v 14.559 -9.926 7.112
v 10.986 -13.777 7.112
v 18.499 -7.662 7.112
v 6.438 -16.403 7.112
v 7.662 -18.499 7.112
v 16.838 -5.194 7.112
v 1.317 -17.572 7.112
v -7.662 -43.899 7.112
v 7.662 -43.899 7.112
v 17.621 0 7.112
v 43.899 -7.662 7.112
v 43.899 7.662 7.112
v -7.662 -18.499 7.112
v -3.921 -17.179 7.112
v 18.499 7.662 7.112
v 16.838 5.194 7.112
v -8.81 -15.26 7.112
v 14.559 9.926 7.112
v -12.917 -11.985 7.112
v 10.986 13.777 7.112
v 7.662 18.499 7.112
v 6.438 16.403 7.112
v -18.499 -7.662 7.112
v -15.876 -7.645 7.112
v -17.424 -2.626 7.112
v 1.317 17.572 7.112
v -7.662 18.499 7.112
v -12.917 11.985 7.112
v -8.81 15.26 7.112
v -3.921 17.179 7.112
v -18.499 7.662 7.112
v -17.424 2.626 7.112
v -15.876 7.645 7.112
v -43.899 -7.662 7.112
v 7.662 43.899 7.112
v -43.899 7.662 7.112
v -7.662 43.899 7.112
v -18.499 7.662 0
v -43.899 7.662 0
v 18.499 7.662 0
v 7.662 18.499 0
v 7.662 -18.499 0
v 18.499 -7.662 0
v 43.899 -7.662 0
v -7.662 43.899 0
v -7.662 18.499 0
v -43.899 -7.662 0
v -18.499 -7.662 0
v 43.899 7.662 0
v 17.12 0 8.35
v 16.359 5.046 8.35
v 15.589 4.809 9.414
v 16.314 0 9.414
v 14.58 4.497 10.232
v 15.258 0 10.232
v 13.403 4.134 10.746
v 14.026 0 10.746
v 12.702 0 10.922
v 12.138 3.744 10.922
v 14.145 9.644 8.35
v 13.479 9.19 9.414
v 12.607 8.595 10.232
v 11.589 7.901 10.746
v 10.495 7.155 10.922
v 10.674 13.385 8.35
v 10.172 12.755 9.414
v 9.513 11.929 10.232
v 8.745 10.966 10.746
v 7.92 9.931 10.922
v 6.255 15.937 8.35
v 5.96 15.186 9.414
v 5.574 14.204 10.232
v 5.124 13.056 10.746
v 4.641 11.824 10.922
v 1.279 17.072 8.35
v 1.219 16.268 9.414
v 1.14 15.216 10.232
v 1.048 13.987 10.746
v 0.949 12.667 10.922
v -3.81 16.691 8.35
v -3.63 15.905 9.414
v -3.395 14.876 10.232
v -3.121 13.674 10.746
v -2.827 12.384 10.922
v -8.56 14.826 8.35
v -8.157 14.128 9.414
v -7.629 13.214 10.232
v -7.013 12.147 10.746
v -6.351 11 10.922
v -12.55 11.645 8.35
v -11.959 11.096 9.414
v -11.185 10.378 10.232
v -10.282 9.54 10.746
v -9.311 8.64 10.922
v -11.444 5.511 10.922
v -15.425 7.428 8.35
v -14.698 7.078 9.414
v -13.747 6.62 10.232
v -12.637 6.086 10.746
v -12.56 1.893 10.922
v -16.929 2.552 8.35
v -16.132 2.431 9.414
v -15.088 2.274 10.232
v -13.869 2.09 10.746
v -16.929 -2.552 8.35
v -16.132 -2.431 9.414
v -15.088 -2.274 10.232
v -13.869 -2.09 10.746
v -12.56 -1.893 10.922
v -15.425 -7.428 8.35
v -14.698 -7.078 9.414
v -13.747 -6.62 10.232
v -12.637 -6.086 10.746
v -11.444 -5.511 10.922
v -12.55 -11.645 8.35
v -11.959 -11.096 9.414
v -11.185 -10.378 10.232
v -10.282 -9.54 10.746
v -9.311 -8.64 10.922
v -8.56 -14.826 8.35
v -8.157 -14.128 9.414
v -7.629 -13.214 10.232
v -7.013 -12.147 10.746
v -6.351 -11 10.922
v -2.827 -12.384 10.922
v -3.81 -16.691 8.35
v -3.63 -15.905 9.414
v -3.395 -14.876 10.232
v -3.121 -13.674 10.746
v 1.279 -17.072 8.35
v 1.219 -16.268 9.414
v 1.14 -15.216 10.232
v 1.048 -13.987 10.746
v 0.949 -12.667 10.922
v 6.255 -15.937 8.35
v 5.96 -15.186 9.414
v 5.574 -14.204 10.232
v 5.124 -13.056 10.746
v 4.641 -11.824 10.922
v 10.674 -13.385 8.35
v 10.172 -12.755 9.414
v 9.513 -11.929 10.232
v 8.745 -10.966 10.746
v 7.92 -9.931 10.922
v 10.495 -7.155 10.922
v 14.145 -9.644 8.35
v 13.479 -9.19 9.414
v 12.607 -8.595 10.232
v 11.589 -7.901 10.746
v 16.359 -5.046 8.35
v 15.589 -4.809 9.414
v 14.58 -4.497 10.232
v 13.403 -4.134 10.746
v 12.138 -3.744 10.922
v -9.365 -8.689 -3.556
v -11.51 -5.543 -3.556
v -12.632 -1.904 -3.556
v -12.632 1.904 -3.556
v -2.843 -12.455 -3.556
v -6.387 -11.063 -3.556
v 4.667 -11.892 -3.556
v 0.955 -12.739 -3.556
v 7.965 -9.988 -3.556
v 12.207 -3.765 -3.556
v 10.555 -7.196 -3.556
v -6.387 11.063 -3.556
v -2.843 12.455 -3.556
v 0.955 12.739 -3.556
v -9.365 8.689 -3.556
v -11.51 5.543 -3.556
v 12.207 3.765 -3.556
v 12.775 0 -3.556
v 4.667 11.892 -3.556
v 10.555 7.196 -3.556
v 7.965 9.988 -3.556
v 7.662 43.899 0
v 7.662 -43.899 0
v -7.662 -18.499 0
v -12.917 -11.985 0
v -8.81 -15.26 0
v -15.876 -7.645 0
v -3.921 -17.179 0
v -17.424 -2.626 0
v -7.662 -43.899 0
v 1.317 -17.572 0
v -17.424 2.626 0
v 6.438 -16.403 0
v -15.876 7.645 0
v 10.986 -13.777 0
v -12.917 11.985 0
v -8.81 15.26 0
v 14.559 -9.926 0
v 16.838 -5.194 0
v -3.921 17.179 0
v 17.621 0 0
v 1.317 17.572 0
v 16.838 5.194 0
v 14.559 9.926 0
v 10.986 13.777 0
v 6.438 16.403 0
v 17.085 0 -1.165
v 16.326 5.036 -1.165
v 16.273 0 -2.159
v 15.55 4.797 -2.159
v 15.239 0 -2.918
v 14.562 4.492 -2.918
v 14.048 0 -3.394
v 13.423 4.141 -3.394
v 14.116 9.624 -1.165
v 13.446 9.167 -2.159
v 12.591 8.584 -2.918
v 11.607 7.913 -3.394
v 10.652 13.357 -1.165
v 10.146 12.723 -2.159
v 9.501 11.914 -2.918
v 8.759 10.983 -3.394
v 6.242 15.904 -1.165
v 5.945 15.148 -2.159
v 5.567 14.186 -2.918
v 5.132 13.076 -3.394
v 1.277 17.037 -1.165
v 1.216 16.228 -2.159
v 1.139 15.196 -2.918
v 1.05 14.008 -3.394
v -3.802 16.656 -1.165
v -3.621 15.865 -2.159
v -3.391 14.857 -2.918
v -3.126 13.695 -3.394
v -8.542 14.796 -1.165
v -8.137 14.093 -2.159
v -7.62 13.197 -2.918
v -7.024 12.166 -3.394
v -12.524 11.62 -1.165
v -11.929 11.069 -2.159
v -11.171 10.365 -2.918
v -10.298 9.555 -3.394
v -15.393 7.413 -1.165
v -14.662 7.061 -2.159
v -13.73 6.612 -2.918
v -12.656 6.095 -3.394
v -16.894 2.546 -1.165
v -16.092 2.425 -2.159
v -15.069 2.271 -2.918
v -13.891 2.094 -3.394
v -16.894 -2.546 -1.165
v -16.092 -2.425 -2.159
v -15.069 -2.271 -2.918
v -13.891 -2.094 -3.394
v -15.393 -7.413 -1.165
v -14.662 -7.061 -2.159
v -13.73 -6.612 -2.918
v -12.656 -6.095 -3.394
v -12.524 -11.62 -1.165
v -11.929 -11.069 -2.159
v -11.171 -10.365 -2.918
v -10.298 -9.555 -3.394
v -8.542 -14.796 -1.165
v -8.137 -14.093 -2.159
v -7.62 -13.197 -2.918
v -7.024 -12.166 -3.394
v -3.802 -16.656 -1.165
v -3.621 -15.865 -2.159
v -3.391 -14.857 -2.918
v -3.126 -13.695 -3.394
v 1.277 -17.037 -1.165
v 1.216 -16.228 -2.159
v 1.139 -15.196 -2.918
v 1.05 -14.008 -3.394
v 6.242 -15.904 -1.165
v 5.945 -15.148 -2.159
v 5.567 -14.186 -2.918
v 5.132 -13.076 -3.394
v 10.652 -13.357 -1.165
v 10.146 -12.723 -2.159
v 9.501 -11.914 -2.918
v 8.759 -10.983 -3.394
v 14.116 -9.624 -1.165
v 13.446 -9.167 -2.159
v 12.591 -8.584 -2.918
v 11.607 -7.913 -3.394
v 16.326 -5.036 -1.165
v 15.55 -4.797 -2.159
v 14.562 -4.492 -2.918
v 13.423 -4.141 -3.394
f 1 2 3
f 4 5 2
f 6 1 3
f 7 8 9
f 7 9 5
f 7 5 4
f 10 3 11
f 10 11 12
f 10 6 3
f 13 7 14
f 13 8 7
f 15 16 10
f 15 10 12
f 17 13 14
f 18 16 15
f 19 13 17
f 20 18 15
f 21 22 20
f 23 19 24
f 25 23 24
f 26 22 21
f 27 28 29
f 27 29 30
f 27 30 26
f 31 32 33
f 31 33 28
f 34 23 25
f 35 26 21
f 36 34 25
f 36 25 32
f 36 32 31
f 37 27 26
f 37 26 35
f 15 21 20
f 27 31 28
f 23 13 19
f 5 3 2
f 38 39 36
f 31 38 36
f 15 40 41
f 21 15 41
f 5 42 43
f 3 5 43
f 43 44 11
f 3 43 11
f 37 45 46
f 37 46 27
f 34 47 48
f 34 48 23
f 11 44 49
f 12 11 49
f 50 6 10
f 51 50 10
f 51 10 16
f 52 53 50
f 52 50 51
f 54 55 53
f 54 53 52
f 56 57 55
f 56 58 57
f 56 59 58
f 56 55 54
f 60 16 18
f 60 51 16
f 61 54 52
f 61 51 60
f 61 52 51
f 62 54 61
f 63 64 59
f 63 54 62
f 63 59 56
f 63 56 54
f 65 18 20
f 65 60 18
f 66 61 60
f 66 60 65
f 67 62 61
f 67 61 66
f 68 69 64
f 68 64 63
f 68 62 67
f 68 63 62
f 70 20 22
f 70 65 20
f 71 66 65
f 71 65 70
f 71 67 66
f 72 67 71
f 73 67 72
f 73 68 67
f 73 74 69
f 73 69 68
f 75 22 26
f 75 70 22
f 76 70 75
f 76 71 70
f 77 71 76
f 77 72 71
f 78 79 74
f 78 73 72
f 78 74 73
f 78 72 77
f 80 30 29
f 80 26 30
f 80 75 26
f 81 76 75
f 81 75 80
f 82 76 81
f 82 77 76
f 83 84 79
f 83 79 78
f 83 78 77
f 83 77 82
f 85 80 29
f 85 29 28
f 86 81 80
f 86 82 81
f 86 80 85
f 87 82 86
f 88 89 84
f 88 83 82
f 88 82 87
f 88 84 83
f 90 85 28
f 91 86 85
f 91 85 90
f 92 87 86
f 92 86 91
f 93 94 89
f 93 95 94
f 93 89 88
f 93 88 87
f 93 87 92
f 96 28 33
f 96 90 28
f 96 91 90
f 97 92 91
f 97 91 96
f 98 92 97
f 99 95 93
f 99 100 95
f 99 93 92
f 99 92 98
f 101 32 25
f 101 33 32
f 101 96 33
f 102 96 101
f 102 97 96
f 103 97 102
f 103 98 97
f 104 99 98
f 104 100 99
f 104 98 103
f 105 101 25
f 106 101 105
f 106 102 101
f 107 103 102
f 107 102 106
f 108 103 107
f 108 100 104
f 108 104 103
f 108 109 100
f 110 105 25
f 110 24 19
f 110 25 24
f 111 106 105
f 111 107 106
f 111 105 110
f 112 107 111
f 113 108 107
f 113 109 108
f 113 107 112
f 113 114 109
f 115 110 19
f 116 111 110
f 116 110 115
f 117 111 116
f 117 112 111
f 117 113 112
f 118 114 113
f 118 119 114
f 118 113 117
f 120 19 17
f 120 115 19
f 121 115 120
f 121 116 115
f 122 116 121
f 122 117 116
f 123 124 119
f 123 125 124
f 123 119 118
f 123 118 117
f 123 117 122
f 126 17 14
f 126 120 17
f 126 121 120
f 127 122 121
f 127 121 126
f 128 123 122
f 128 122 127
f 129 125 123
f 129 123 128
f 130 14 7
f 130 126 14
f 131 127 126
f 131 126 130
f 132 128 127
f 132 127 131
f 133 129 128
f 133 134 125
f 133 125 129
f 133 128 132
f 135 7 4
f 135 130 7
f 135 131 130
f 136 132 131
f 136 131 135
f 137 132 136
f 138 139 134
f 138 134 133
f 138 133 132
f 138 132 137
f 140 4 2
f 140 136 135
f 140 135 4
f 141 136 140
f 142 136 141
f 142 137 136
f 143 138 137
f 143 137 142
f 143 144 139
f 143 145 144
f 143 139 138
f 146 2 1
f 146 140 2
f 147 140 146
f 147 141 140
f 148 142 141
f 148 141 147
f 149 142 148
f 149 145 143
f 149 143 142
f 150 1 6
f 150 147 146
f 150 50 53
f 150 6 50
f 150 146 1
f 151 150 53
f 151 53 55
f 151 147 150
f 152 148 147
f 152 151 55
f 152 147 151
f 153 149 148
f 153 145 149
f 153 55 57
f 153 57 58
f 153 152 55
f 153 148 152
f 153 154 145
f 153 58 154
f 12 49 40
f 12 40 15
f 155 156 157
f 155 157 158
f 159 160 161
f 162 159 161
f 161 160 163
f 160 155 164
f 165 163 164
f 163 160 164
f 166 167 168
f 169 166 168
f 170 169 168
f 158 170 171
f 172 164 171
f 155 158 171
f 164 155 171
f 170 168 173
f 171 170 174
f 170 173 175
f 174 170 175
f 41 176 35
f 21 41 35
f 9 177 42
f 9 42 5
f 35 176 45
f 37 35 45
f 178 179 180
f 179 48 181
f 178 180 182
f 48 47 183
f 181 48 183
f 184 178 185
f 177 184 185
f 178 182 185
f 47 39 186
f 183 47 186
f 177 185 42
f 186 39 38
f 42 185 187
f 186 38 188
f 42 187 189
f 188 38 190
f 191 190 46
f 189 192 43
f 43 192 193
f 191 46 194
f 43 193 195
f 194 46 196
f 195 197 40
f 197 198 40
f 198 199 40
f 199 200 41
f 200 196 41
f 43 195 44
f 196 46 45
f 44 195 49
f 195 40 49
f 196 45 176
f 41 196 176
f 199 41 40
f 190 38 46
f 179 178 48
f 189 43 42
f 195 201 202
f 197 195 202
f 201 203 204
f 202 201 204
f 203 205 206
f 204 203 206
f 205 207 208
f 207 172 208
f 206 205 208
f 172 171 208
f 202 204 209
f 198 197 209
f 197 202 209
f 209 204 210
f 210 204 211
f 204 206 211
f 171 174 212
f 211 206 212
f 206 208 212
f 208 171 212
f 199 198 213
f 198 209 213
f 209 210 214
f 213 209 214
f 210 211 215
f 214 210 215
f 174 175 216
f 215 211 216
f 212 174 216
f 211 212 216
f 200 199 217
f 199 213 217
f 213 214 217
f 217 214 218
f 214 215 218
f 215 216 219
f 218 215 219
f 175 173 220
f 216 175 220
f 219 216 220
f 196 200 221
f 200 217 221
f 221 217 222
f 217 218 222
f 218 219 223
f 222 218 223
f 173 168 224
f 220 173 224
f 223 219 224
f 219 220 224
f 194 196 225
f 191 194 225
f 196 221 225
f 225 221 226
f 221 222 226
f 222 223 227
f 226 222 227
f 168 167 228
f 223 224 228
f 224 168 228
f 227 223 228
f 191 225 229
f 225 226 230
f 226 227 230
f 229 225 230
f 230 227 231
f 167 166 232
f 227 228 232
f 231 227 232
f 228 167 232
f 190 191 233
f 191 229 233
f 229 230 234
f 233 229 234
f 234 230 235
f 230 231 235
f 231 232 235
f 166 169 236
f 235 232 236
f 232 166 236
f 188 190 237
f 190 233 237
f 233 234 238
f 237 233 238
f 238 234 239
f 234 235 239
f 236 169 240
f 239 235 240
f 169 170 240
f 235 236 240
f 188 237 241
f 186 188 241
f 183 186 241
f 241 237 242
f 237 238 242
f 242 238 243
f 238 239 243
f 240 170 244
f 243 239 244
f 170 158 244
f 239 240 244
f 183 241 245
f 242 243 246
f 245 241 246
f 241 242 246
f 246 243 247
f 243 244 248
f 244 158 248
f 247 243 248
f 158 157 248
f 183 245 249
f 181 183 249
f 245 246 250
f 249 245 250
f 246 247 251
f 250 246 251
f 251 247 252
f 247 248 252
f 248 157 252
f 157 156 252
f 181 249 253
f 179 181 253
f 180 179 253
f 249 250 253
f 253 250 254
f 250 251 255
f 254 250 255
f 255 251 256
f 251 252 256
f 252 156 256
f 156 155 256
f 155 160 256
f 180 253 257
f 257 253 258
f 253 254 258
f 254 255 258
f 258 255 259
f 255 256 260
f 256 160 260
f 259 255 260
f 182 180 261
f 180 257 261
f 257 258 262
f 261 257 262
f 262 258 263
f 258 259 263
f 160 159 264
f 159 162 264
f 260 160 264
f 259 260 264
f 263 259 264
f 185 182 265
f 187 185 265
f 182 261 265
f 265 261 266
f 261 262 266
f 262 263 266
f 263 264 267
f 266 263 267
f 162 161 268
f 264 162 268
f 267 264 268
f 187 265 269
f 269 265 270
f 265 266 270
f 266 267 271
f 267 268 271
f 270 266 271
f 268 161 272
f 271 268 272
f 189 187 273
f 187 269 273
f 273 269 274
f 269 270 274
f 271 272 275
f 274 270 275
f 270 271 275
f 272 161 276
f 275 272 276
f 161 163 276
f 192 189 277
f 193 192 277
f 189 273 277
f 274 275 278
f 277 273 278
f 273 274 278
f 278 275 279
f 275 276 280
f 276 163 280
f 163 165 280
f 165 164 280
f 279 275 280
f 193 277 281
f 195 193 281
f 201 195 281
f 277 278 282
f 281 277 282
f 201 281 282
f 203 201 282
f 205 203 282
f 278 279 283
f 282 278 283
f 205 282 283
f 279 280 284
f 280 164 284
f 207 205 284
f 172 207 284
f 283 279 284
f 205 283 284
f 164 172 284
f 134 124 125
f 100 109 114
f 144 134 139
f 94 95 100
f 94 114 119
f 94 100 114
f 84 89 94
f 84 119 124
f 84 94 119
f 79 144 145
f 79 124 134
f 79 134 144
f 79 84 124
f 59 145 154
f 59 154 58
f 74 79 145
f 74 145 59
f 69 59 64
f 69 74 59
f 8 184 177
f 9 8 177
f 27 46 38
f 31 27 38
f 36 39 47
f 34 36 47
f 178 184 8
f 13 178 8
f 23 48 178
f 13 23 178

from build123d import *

# Parameters (mm, degrees)
F1_DEPTH = 7.112
F2_DEPTH = 25.4
F3_DEPTH = 25.4
F4_DEPTH = 25.4
F5_DEPTH = 25.4
F6_R     = 17.6209063201
F7_DEPTH = 10.922
F8_DEPTH = 3.556


# Not quite as in the source:
# - a fillet or chamfer that OpenCascade refuses, or shapes differently, is made with other operations: its cross-section is extruded or revolved along the edge and cut away or added


with BuildPart() as f1:
    # F0 (on Top) → F1 (new body)
    with BuildSketch(Plane.XY):
        Polygon((7.6623515216, 18.4985529631), (-7.6623515216, 18.4985529631), (-18.4985529631, 7.6623515216), (-18.4985529631, -7.6623515216), (-7.6623515216, -18.4985529631), (7.6623515216, -18.4985529631), (18.4985529631, -7.6623515216), (18.4985529631, 7.6623515216), align=None)
    extrude(amount=F1_DEPTH)

    # F2 (add): a face of the model
    f2_faces = [f1.faces().sort_by_distance(p)[0] for p in [
        (0, -18.4985529631, 3.556),
    ]]
    extrude(f2_faces, amount=F2_DEPTH)

    # F3 (add): a face of the model
    f3_faces = [f1.faces().sort_by_distance(p)[0] for p in [
        (-18.4985529631, 0, 3.556),
    ]]
    extrude(f3_faces, amount=F3_DEPTH)

    # F4 (add): a face of the model
    f4_faces = [f1.faces().sort_by_distance(p)[0] for p in [
        (0, 18.4985529631, 3.556),
    ]]
    extrude(f4_faces, amount=F4_DEPTH)

    # F5 (add): a face of the model
    f5_faces = [f1.faces().sort_by_distance(p)[0] for p in [
        (18.4985529631, 0, 3.556),
    ]]
    extrude(f5_faces, amount=F5_DEPTH)

    # F6 (on Top) → F7 (join)
    with BuildSketch(Plane.XY):
        Circle(F6_R)
    extrude(amount=F7_DEPTH)

    # F6 (on Top) → F8 (join)
    with BuildSketch(Plane.XY):
        Circle(F6_R)
    extrude(amount=-F8_DEPTH)

    # F9: fillet of radius 5.08 on 1 edges, made by hand

    # F9_s1 → F9_t2 (revolve, cut)
    with BuildSketch(Plane.XZ):
        with BuildLine():
            ThreePointArc((17.6209063201, 7.112), (15.8130694437, 9.8580926284), (12.7022174704, 10.922))
            Line((12.7022174704, 10.922), (17.6209063201, 10.922))
            Line((17.6209063201, 10.922), (17.6209063201, 7.112))
        make_face()
    revolve(axis=Axis((0, 0, 10.922), (0, 0, 1)), mode=Mode.SUBTRACT)

    # F10: fillet of radius 5.08 on 1 edges, made by hand

    # F10_s1 → F10_t2 (revolve, cut)
    with BuildSketch(Plane.XZ):
        with BuildLine():
            ThreePointArc((17.6209063201, 0), (15.7802637067, -2.5716269361), (12.7748951769, -3.556))
            Line((12.7748951769, -3.556), (17.6209063201, -3.556))
            Line((17.6209063201, -3.556), (17.6209063201, 0))
        make_face()
    revolve(axis=Axis((0, 0, -3.556), (0, 0, 1)), mode=Mode.SUBTRACT)


solid = f1.part
